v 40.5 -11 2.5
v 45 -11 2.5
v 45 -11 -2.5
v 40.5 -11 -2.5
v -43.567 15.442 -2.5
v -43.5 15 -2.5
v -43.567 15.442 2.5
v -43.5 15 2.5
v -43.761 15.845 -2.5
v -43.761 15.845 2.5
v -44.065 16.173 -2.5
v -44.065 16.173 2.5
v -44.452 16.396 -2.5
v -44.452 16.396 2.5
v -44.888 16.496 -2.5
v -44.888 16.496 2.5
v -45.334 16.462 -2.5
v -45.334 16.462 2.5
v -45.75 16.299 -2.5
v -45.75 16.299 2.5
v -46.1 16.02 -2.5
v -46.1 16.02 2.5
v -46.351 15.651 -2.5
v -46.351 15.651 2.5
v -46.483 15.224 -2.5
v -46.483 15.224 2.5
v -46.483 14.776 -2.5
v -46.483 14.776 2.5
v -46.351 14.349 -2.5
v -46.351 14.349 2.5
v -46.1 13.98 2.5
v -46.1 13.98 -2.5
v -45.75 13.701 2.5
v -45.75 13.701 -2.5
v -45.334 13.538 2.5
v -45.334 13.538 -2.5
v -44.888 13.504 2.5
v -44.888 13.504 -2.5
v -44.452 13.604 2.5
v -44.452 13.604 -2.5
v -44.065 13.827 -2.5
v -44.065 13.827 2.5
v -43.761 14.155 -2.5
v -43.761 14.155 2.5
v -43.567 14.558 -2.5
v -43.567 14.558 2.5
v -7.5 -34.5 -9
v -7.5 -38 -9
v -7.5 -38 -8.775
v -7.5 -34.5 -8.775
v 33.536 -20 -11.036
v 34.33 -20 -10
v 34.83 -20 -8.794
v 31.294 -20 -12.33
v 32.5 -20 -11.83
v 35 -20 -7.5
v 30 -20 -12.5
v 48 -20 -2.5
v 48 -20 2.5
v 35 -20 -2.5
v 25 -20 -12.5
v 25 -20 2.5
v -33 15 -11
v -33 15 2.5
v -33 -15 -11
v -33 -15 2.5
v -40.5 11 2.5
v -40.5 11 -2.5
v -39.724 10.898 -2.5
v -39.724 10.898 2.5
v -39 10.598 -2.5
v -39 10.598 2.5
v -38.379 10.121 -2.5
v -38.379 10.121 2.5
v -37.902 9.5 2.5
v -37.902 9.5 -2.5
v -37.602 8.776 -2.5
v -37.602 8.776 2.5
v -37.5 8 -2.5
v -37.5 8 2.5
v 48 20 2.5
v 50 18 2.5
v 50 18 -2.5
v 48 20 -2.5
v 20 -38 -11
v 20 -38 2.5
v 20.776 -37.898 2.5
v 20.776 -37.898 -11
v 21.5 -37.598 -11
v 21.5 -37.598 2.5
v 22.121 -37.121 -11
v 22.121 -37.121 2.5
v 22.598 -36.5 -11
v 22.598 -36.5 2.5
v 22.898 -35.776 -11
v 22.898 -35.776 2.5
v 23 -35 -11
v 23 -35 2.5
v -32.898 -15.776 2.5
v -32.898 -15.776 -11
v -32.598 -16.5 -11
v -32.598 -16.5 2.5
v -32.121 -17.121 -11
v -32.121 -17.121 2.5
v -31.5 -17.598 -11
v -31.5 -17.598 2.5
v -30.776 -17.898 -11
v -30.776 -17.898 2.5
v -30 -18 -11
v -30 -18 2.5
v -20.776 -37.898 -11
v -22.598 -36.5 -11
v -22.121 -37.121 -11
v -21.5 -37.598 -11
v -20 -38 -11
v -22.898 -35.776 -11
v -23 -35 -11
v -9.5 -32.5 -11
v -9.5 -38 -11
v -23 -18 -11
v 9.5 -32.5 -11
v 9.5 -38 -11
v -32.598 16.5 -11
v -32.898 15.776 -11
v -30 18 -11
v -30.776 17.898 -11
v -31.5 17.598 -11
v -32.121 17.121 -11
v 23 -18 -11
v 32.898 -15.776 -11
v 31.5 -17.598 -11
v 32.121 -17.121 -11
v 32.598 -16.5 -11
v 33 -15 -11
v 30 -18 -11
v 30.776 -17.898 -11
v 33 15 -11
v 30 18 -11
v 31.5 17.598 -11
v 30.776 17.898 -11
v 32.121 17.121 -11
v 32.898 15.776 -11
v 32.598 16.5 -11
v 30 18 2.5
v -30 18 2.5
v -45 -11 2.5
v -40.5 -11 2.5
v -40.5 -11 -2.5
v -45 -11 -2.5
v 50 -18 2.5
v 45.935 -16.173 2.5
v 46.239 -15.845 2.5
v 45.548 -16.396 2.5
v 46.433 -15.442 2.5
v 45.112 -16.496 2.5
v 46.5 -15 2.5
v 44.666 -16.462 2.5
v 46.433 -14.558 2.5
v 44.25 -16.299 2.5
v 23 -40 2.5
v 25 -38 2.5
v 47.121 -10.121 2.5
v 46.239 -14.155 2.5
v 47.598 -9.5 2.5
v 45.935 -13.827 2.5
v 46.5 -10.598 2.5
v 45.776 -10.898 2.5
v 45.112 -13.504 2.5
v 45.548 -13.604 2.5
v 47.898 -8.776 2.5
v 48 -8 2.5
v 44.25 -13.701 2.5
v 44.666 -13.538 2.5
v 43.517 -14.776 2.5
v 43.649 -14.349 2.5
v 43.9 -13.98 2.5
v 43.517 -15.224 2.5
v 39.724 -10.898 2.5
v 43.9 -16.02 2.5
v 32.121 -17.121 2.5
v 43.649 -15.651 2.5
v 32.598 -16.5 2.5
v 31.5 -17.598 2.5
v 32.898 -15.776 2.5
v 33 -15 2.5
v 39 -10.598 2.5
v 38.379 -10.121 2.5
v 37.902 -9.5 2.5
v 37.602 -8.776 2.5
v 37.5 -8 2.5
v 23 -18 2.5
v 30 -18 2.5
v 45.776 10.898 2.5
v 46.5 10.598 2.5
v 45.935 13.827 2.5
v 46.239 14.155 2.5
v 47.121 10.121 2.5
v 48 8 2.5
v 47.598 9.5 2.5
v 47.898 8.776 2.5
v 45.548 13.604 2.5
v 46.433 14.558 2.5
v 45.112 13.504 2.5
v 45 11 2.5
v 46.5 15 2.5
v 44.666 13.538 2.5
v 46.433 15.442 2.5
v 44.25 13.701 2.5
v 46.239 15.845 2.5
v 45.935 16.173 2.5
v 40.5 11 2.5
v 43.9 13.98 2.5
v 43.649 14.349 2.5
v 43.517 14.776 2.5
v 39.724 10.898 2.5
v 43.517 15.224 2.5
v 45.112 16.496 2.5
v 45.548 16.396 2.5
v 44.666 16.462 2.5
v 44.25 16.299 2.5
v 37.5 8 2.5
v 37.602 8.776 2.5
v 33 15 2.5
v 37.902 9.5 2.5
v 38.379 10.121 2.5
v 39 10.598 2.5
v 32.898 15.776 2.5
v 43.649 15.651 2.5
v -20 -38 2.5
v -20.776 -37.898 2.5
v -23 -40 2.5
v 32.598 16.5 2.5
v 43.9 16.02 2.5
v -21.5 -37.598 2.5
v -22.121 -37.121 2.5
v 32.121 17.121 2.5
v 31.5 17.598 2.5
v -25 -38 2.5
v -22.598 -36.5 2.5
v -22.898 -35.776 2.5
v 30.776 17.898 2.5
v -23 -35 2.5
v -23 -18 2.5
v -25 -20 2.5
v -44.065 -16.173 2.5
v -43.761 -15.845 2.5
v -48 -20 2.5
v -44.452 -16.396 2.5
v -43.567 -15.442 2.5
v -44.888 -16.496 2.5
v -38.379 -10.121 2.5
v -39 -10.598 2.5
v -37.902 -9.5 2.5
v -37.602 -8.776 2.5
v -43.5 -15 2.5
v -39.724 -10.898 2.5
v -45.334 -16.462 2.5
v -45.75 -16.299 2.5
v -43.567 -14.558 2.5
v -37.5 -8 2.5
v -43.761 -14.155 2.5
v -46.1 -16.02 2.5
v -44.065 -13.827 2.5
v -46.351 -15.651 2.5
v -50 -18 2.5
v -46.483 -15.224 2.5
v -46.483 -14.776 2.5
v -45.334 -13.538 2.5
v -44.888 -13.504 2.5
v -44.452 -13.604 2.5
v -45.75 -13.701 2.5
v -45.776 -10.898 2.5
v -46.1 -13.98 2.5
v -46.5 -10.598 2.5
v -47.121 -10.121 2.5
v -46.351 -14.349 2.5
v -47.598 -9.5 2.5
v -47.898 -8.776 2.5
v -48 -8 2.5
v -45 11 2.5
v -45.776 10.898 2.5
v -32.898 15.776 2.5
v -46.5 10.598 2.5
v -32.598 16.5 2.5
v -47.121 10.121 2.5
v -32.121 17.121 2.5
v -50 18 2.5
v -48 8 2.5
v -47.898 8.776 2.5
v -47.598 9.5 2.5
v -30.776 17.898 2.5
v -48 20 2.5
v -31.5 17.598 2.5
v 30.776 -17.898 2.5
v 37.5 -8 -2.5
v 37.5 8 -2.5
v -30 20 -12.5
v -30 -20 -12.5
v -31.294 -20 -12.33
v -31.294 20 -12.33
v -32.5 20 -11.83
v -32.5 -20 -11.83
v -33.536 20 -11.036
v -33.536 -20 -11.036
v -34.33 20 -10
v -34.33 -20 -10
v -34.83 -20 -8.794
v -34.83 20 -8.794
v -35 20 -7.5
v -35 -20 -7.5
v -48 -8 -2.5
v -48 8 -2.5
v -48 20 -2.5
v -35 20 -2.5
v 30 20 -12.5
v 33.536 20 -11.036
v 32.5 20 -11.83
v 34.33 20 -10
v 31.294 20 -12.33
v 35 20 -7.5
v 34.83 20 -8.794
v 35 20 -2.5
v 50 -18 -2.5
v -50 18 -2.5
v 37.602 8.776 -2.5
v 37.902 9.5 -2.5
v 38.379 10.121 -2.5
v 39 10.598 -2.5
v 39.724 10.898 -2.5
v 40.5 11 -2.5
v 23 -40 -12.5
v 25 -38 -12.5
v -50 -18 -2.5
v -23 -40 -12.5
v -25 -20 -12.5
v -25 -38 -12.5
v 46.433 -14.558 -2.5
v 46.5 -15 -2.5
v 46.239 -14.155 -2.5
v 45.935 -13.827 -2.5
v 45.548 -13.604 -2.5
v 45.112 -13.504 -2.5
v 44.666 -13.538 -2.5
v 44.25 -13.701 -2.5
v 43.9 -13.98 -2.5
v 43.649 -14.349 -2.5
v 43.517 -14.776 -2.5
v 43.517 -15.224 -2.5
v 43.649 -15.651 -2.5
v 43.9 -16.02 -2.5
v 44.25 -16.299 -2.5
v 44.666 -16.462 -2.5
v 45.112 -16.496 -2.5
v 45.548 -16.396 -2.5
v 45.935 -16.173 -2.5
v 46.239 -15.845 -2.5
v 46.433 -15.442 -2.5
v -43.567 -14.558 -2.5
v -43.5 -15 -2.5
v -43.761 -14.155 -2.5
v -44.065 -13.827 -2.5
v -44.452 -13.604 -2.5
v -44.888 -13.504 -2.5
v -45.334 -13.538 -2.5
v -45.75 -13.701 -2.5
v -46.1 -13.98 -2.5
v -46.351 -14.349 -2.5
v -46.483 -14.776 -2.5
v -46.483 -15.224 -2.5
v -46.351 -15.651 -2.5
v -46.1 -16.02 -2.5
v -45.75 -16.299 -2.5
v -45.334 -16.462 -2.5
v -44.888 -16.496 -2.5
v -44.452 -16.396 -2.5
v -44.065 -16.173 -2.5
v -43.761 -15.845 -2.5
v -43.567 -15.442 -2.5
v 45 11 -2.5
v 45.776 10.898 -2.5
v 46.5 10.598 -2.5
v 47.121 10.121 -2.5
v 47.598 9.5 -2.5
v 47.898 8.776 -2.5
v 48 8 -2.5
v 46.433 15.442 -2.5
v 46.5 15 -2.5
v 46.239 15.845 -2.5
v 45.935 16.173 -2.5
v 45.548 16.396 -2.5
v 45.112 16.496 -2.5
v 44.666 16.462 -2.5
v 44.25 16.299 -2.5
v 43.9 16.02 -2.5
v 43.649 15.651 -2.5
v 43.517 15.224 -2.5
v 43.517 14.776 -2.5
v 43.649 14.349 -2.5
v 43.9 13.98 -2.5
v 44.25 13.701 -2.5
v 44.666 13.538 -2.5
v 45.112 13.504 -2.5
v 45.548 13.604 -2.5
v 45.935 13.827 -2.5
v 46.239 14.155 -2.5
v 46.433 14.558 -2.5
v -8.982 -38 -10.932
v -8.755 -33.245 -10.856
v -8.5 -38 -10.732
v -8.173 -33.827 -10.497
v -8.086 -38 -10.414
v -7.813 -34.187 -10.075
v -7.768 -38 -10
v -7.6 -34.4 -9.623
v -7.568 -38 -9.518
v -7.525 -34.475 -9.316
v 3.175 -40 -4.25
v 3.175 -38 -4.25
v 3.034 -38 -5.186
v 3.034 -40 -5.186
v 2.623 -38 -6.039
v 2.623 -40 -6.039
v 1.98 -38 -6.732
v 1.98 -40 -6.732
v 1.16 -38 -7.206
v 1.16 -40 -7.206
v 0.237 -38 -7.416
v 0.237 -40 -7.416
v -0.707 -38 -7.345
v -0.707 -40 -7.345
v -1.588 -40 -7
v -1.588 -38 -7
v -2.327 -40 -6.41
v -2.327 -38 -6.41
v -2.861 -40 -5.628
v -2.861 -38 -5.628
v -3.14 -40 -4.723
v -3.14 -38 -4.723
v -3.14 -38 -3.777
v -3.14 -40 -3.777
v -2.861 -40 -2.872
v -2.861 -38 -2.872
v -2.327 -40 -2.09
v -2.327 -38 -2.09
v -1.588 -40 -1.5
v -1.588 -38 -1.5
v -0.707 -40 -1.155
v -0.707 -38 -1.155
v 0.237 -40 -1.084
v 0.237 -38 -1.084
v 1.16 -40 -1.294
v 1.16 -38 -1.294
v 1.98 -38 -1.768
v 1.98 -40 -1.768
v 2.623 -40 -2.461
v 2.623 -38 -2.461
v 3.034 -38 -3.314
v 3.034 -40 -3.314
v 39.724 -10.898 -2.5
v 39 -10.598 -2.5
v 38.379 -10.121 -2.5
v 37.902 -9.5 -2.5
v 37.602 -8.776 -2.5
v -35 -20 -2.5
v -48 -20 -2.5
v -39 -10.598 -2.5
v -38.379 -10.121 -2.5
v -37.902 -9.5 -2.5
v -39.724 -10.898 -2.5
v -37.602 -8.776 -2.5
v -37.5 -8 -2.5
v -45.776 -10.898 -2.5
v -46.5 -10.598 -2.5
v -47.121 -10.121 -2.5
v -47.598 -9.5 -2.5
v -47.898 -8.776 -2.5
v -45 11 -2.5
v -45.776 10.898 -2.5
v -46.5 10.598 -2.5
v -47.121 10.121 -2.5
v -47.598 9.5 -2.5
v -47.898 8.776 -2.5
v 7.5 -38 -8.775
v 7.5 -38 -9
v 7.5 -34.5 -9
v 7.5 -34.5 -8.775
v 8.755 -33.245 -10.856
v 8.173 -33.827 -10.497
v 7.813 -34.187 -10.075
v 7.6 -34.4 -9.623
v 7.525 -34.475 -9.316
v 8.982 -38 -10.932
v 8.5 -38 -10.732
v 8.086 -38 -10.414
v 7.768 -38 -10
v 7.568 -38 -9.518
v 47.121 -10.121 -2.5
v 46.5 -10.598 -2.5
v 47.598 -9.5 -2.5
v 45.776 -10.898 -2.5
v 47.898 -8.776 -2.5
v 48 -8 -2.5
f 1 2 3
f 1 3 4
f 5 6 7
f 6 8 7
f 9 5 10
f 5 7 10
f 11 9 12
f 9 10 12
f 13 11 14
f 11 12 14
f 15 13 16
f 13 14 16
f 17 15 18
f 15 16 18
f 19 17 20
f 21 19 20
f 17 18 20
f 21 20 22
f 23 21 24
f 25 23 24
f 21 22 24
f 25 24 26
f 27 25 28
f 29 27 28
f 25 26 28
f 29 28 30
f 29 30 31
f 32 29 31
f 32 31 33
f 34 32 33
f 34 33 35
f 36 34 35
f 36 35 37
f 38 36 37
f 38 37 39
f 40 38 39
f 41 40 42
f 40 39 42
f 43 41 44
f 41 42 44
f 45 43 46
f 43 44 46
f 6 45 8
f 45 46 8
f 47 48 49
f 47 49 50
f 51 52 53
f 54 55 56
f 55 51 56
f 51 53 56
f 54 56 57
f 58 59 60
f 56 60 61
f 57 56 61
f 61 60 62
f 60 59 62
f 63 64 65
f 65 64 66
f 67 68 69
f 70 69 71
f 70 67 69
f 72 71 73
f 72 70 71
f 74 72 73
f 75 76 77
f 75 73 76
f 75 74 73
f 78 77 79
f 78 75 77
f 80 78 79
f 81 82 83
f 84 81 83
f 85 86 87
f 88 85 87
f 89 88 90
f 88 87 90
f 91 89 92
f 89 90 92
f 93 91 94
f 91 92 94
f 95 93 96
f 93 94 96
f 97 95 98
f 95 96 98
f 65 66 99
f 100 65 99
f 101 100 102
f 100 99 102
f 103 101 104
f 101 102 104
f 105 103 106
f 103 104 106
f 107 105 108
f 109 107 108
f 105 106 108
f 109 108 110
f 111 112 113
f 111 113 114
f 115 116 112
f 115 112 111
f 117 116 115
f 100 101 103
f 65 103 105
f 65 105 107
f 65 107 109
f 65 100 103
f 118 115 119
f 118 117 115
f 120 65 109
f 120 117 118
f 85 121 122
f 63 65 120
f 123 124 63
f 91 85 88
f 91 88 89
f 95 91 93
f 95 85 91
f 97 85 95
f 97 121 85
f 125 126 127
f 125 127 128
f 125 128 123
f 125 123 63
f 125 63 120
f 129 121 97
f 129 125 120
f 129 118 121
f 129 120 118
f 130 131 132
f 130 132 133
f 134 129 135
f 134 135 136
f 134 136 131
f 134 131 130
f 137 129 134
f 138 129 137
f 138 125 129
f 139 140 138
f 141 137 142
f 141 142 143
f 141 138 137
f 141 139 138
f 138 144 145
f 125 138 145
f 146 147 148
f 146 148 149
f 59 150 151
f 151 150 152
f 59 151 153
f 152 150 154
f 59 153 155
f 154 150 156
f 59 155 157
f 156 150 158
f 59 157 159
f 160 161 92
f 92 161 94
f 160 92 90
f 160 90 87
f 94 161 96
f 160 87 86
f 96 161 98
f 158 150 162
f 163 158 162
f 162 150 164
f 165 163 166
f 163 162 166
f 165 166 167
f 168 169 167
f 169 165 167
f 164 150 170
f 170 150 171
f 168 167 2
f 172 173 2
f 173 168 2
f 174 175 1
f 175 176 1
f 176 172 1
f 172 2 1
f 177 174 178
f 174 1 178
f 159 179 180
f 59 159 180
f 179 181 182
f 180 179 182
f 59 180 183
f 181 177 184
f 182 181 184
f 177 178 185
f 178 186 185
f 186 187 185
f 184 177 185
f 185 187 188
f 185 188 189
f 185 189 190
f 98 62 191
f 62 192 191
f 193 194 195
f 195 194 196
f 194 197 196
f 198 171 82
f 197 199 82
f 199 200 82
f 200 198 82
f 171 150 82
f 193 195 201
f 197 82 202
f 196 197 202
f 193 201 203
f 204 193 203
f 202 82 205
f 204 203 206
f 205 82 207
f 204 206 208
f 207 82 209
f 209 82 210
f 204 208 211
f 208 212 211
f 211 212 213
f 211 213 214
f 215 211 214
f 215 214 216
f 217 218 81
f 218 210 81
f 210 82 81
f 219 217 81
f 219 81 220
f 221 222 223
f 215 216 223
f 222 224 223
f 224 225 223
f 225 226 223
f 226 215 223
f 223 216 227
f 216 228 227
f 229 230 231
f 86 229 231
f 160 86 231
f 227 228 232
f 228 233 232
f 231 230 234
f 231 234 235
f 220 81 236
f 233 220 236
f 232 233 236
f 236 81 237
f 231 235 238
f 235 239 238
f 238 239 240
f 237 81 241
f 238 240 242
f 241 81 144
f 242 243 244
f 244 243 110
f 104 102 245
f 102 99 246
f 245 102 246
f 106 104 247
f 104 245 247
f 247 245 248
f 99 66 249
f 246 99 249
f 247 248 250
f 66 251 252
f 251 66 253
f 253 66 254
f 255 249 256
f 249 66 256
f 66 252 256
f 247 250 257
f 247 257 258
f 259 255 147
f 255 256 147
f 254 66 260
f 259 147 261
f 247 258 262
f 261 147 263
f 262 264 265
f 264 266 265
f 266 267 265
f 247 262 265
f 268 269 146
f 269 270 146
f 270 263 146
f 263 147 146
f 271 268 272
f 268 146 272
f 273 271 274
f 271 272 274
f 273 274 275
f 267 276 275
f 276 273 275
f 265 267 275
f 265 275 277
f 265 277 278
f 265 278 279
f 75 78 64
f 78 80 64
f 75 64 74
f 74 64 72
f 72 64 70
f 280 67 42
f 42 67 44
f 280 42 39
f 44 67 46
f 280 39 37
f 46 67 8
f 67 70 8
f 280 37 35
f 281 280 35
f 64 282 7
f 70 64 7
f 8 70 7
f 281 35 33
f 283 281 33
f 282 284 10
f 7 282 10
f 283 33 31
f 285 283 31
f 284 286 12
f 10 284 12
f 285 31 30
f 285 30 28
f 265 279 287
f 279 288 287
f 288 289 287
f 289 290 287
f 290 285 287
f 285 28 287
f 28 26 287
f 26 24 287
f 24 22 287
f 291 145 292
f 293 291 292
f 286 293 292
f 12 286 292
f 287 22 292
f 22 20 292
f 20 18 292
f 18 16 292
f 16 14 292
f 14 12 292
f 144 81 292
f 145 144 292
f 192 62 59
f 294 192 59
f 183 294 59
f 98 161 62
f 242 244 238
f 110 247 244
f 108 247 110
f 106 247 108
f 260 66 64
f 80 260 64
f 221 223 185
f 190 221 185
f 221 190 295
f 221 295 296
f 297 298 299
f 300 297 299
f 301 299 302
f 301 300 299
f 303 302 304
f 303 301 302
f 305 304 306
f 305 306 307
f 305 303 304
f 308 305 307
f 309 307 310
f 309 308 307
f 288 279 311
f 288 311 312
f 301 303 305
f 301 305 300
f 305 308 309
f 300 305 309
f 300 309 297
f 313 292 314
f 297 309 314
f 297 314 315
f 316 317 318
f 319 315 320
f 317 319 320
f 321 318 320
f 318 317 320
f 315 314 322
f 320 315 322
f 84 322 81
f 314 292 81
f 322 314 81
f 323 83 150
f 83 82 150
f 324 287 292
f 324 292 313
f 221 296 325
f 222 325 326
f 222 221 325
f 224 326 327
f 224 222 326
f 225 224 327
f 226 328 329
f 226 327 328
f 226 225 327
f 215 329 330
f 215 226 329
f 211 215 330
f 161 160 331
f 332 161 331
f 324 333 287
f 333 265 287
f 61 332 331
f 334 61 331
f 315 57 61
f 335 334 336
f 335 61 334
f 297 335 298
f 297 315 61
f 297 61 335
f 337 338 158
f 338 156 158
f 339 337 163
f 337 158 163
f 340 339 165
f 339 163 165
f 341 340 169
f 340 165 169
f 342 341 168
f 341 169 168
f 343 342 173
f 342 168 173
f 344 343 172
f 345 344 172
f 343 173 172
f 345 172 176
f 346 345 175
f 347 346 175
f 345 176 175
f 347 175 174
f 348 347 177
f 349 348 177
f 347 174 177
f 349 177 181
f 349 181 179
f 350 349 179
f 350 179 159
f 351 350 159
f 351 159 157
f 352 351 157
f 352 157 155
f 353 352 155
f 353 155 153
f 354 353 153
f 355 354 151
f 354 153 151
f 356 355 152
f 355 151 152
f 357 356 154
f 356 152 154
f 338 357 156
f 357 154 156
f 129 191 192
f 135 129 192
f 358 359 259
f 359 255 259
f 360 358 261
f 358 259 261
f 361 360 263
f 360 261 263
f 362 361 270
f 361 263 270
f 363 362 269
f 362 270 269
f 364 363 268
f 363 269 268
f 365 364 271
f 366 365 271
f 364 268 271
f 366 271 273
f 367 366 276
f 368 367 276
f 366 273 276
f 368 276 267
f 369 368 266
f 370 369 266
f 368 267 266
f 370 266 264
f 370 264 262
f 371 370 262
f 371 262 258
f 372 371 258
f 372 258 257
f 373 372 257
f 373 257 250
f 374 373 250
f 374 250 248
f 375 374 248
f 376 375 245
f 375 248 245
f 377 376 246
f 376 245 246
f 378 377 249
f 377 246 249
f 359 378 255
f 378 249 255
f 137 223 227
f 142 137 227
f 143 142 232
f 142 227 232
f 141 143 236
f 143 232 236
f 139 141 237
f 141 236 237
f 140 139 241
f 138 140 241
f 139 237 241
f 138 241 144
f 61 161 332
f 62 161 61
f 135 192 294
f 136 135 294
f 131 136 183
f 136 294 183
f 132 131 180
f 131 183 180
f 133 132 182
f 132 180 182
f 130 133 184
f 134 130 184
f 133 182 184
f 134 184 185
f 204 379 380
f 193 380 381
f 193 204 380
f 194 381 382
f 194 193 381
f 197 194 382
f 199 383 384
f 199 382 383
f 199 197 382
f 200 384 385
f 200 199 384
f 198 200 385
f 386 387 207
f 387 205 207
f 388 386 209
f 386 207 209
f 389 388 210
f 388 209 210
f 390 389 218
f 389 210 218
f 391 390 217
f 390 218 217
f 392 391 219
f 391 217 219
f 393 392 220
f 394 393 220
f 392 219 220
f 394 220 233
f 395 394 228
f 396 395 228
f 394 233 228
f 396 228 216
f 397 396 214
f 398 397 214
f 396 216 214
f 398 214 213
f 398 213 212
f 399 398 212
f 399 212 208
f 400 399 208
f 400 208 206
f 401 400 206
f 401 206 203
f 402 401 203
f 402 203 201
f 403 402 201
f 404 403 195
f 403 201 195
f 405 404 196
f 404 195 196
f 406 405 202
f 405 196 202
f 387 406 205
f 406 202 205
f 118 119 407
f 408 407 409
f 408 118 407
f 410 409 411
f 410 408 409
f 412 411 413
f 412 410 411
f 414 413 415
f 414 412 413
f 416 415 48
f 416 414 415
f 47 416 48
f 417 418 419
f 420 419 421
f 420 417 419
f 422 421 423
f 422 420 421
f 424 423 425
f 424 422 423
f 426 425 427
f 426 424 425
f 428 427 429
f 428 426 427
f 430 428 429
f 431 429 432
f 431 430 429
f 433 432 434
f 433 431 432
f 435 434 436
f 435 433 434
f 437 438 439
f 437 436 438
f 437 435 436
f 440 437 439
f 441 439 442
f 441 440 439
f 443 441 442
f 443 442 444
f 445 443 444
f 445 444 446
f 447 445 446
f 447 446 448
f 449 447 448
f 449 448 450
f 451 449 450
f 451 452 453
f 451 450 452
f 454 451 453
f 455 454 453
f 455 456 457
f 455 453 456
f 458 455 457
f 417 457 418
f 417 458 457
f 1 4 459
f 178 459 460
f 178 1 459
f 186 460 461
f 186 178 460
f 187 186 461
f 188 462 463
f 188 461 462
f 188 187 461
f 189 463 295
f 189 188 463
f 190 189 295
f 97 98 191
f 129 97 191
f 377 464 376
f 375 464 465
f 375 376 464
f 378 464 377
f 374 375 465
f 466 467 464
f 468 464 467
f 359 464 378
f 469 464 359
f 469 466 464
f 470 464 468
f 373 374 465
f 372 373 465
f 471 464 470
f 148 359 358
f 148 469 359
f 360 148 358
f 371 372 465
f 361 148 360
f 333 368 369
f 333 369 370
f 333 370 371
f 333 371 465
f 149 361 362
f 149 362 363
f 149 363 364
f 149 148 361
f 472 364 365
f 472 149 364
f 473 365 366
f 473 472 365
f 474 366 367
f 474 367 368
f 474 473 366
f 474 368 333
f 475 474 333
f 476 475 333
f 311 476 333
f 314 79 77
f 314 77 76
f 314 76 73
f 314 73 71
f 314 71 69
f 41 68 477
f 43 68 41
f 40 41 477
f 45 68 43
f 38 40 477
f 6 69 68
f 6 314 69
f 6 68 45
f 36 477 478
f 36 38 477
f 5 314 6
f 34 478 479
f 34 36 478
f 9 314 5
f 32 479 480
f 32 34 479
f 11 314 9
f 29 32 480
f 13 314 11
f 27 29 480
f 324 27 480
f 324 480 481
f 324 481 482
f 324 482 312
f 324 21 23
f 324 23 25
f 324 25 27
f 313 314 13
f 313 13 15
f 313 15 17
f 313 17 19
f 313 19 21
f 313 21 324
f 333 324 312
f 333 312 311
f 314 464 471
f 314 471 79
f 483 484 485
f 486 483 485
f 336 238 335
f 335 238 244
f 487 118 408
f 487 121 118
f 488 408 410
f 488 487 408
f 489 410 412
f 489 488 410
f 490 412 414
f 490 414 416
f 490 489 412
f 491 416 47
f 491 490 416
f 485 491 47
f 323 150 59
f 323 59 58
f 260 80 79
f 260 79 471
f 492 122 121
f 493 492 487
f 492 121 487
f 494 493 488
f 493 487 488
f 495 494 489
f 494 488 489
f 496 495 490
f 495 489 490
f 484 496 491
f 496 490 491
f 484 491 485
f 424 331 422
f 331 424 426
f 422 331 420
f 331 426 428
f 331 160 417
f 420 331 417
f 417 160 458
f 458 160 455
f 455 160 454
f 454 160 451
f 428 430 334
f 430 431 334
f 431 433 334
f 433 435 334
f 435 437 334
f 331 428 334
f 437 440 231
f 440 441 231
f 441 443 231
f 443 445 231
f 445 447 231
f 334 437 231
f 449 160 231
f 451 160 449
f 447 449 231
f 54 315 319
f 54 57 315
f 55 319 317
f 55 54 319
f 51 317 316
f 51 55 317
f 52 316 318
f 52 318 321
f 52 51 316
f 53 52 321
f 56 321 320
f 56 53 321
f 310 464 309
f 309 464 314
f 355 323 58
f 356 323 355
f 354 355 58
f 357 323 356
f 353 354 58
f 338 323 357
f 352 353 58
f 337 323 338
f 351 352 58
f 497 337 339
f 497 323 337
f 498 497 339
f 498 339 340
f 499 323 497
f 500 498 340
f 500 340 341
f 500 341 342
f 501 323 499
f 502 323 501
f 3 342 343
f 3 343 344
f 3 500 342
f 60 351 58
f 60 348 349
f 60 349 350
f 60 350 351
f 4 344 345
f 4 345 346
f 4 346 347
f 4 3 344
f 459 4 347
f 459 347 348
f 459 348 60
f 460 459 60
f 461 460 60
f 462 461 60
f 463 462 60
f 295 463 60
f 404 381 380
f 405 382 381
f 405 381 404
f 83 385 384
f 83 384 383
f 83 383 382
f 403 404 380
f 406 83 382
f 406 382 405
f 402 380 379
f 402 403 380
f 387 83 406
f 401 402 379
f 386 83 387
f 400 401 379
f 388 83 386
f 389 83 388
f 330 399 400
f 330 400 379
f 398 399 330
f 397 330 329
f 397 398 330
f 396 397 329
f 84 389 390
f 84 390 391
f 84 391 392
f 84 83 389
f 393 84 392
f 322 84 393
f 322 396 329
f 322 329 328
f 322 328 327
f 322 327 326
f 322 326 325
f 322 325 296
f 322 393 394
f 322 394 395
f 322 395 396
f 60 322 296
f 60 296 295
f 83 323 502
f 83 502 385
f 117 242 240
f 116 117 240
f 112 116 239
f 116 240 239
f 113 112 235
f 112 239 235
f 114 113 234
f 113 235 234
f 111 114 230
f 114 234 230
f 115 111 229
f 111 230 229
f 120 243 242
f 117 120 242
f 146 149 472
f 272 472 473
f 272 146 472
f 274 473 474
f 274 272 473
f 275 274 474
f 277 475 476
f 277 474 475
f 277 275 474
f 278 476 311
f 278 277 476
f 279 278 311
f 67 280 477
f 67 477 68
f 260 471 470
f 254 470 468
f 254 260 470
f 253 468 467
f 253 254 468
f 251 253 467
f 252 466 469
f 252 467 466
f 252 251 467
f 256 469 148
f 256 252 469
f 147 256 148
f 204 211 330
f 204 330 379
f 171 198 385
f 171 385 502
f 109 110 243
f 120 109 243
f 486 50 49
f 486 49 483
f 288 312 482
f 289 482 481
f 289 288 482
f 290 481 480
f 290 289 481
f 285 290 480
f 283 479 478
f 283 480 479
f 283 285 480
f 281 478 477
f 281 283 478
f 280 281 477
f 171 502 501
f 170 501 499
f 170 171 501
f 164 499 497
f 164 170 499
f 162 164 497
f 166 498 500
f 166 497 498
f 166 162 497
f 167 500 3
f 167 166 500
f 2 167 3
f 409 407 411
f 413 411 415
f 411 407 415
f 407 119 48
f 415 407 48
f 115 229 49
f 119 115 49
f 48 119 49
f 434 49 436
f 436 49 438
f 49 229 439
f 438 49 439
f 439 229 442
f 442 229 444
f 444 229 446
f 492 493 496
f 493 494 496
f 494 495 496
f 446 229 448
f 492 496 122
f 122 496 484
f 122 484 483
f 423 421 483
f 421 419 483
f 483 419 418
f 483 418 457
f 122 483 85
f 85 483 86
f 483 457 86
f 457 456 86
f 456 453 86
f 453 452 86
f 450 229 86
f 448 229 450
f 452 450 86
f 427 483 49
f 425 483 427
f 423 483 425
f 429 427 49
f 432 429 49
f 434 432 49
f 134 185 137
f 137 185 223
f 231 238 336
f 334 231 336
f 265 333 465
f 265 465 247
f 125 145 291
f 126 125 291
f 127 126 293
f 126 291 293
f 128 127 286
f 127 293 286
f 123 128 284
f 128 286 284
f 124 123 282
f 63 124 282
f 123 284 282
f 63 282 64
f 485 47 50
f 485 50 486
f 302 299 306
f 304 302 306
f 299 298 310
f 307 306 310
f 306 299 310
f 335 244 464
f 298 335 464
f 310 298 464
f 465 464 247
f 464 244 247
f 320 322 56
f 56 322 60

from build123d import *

# Parameters (mm, degrees)
AUFSATZ_LINEAR_AUSTRAGEN1_DEPTH      = 2.5
AUFSATZ_LINEAR_AUSTRAGEN1_DEPTH_BACK = 2.5
SKIZZE2_R                            = 1.5
SCHNITT_LINEAR_AUSTRAGEN1_DEPTH      = 3.5
SCHNITT_LINEAR_AUSTRAGEN1_DEPTH_BACK = 3.5
SCHNITT_LINEAR_AUSTRAGEN2_DEPTH      = 3.5
SCHNITT_LINEAR_AUSTRAGEN2_DEPTH_BACK = 3.5
SKIZZE7_W                            = 50
SKIZZE7_H                            = 20
AUFSATZ_LINEAR_AUSTRAGEN3_DEPTH      = 10
SCHNITT_LINEAR_AUSTRAGEN6_DEPTH      = 13.5
FASE1_SIZE                           = 2
SKETCH1_R                            = 3.175
CUT_EXTRUDE1_DEPTH                   = 10
SKETCH2_W                            = 15
SKETCH2_H                            = 3.5
BOSS_EXTRUDE1_DEPTH                  = 2.225
FILLET2_R                            = 5
FILLET1_R                            = 2


with BuildPart() as part:
    # Skizze1 → Aufsatz-Linear austragen1 (new body, two sides)
    with BuildSketch(Plane.XY) as aufsatz_linear_austragen1_sk:
        Polygon((-50, -20), (-50, 20), (50, 20), (50, -20), (25, -20), (25, -40), (-25, -40), (-25, -20), align=None)
    extrude(amount=AUFSATZ_LINEAR_AUSTRAGEN1_DEPTH)
    extrude(aufsatz_linear_austragen1_sk.sketch, amount=-AUFSATZ_LINEAR_AUSTRAGEN1_DEPTH_BACK)

    # Skizze2 → Schnitt-Linear austragen1 (cut, two sides)
    with BuildSketch(Plane.XY) as schnitt_linear_austragen1_sk:
        with Locations((-45, 15)):
            Circle(SKIZZE2_R)
        with Locations((-45, -15)):
            Circle(SKIZZE2_R)
        with Locations((45, -15)):
            Circle(SKIZZE2_R)
        with Locations((45, 15)):
            Circle(SKIZZE2_R)
    extrude(amount=SCHNITT_LINEAR_AUSTRAGEN1_DEPTH, mode=Mode.SUBTRACT)
    extrude(schnitt_linear_austragen1_sk.sketch, amount=-SCHNITT_LINEAR_AUSTRAGEN1_DEPTH_BACK, mode=Mode.SUBTRACT)

    # Skizze4 → Schnitt-Linear austragen2 (cut, two sides)
    with BuildSketch(Plane.XY) as schnitt_linear_austragen2_sk:
        with BuildLine():
            Line((-48, -8), (-48, 8))
            ThreePointArc((-48, 8), (-47.121320344, 10.121320344), (-45, 11))
            Line((-45, 11), (-40.5, 11))
            ThreePointArc((-40.5, 11), (-38.378679656, 10.121320344), (-37.5, 8))
            Line((-37.5, 8), (-37.5, -8))
            ThreePointArc((-37.5, -8), (-38.378679656, -10.121320344), (-40.5, -11))
            Line((-40.5, -11), (-45, -11))
            ThreePointArc((-45, -11), (-47.121320344, -10.121320344), (-48, -8))
        make_face()
        with BuildLine():
            Line((45, -11), (40.5, -11))
            ThreePointArc((40.5, -11), (38.378679656, -10.121320344), (37.5, -8))
            Line((37.5, -8), (37.5, 8))
            ThreePointArc((37.5, 8), (38.378679656, 10.121320344), (40.5, 11))
            Line((40.5, 11), (45, 11))
            ThreePointArc((45, 11), (47.121320344, 10.121320344), (48, 8))
            Line((48, 8), (48, -8))
            ThreePointArc((48, -8), (47.121320344, -10.121320344), (45, -11))
        make_face()
    extrude(amount=SCHNITT_LINEAR_AUSTRAGEN2_DEPTH, mode=Mode.SUBTRACT)
    extrude(schnitt_linear_austragen2_sk.sketch, amount=-SCHNITT_LINEAR_AUSTRAGEN2_DEPTH_BACK, mode=Mode.SUBTRACT)

    # Skizze7 → Aufsatz-Linear austragen3 (add)
    with BuildSketch(Plane(origin=(0, 0, -2.5), x_dir=(-1, 0, 0), z_dir=(0, 0, -1))):
        with Locations((0, -30)):
            Rectangle(SKIZZE7_W, SKIZZE7_H)
        Polygon((35, 20), (-35, 20), (-35, -20), (-25, -20), (25, -20), (35, -20), align=None)
    extrude(amount=AUFSATZ_LINEAR_AUSTRAGEN3_DEPTH)

    # Skizze8 → Schnitt-Linear austragen6 (cut)
    with BuildSketch(Plane.XY.offset(2.5)):
        with BuildLine():
            Line((30, 18), (-30, 18))
            ThreePointArc((-30, 18), (-32.121320344, 17.121320344), (-33, 15))
            Line((-33, 15), (-33, -15))
            ThreePointArc((-33, -15), (-32.121320344, -17.121320344), (-30, -18))
            Line((-30, -18), (30, -18))
            ThreePointArc((30, -18), (32.121320344, -17.121320344), (33, -15))
            Line((33, -15), (33, 15))
            ThreePointArc((33, 15), (32.121320344, 17.121320344), (30, 18))
        make_face()
        with BuildLine():
            Line((23, -18), (-23, -18))
            Line((-23, -18), (-23, -35))
            ThreePointArc((-23, -35), (-22.121320344, -37.121320344), (-20, -38))
            Line((-20, -38), (20, -38))
            ThreePointArc((20, -38), (22.121320344, -37.121320344), (23, -35))
            Line((23, -35), (23, -18))
        make_face()
    extrude(amount=-SCHNITT_LINEAR_AUSTRAGEN6_DEPTH, mode=Mode.SUBTRACT)

    # Fase1
    fase1_edges = [part.edges().sort_by_distance(p)[0] for p in [
        (-50, -20, 0),
        (-50, 20, 0),
        (50, 20, 0),
        (50, -20, 0),
        (25, -40, -5),
        (-25, -40, -5),
    ]]
    chamfer(fase1_edges, length=FASE1_SIZE)

    # Sketch1 → Cut-Extrude1 (cut)
    with BuildSketch(Plane(origin=(0, -40, 0), x_dir=(1, 0, 0), z_dir=(0, 1, 0))):
        with Locations((0, 4.25)):
            Circle(SKETCH1_R)
    extrude(amount=CUT_EXTRUDE1_DEPTH, mode=Mode.SUBTRACT)

    # Sketch2 → Boss-Extrude1 (add)
    with BuildSketch(Plane.XY.offset(-11)):
        with Locations((0, -36.25)):
            Rectangle(SKETCH2_W, SKETCH2_H)
    extrude(amount=BOSS_EXTRUDE1_DEPTH)

    # Fillet2
    fillet2_edges = [part.edges().sort_by_distance(p)[0] for p in [
        (-35, 0, -12.5),
        (35, 0, -12.5),
    ]]
    fillet(fillet2_edges, radius=FILLET2_R)

    # Fillet1
    fillet1_edges = [part.edges().sort_by_distance(p)[0] for p in [
        (-7.5, -36.25, -11),
        (7.5, -36.25, -11),
        (0, -34.5, -11),
    ]]
    fillet(fillet1_edges, radius=FILLET1_R)


solid = part.part
